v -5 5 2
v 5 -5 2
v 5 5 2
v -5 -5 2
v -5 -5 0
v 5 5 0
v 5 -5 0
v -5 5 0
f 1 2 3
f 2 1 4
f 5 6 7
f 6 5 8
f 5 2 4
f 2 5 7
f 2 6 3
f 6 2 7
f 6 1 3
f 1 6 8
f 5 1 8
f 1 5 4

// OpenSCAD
// plate 2x2

// external vars #########################

ext_scale = 1.0;

// part ##################################

scale([ext_scale,ext_scale,ext_scale])
translate([-5,-5,0])
cube([10,10,2]);
